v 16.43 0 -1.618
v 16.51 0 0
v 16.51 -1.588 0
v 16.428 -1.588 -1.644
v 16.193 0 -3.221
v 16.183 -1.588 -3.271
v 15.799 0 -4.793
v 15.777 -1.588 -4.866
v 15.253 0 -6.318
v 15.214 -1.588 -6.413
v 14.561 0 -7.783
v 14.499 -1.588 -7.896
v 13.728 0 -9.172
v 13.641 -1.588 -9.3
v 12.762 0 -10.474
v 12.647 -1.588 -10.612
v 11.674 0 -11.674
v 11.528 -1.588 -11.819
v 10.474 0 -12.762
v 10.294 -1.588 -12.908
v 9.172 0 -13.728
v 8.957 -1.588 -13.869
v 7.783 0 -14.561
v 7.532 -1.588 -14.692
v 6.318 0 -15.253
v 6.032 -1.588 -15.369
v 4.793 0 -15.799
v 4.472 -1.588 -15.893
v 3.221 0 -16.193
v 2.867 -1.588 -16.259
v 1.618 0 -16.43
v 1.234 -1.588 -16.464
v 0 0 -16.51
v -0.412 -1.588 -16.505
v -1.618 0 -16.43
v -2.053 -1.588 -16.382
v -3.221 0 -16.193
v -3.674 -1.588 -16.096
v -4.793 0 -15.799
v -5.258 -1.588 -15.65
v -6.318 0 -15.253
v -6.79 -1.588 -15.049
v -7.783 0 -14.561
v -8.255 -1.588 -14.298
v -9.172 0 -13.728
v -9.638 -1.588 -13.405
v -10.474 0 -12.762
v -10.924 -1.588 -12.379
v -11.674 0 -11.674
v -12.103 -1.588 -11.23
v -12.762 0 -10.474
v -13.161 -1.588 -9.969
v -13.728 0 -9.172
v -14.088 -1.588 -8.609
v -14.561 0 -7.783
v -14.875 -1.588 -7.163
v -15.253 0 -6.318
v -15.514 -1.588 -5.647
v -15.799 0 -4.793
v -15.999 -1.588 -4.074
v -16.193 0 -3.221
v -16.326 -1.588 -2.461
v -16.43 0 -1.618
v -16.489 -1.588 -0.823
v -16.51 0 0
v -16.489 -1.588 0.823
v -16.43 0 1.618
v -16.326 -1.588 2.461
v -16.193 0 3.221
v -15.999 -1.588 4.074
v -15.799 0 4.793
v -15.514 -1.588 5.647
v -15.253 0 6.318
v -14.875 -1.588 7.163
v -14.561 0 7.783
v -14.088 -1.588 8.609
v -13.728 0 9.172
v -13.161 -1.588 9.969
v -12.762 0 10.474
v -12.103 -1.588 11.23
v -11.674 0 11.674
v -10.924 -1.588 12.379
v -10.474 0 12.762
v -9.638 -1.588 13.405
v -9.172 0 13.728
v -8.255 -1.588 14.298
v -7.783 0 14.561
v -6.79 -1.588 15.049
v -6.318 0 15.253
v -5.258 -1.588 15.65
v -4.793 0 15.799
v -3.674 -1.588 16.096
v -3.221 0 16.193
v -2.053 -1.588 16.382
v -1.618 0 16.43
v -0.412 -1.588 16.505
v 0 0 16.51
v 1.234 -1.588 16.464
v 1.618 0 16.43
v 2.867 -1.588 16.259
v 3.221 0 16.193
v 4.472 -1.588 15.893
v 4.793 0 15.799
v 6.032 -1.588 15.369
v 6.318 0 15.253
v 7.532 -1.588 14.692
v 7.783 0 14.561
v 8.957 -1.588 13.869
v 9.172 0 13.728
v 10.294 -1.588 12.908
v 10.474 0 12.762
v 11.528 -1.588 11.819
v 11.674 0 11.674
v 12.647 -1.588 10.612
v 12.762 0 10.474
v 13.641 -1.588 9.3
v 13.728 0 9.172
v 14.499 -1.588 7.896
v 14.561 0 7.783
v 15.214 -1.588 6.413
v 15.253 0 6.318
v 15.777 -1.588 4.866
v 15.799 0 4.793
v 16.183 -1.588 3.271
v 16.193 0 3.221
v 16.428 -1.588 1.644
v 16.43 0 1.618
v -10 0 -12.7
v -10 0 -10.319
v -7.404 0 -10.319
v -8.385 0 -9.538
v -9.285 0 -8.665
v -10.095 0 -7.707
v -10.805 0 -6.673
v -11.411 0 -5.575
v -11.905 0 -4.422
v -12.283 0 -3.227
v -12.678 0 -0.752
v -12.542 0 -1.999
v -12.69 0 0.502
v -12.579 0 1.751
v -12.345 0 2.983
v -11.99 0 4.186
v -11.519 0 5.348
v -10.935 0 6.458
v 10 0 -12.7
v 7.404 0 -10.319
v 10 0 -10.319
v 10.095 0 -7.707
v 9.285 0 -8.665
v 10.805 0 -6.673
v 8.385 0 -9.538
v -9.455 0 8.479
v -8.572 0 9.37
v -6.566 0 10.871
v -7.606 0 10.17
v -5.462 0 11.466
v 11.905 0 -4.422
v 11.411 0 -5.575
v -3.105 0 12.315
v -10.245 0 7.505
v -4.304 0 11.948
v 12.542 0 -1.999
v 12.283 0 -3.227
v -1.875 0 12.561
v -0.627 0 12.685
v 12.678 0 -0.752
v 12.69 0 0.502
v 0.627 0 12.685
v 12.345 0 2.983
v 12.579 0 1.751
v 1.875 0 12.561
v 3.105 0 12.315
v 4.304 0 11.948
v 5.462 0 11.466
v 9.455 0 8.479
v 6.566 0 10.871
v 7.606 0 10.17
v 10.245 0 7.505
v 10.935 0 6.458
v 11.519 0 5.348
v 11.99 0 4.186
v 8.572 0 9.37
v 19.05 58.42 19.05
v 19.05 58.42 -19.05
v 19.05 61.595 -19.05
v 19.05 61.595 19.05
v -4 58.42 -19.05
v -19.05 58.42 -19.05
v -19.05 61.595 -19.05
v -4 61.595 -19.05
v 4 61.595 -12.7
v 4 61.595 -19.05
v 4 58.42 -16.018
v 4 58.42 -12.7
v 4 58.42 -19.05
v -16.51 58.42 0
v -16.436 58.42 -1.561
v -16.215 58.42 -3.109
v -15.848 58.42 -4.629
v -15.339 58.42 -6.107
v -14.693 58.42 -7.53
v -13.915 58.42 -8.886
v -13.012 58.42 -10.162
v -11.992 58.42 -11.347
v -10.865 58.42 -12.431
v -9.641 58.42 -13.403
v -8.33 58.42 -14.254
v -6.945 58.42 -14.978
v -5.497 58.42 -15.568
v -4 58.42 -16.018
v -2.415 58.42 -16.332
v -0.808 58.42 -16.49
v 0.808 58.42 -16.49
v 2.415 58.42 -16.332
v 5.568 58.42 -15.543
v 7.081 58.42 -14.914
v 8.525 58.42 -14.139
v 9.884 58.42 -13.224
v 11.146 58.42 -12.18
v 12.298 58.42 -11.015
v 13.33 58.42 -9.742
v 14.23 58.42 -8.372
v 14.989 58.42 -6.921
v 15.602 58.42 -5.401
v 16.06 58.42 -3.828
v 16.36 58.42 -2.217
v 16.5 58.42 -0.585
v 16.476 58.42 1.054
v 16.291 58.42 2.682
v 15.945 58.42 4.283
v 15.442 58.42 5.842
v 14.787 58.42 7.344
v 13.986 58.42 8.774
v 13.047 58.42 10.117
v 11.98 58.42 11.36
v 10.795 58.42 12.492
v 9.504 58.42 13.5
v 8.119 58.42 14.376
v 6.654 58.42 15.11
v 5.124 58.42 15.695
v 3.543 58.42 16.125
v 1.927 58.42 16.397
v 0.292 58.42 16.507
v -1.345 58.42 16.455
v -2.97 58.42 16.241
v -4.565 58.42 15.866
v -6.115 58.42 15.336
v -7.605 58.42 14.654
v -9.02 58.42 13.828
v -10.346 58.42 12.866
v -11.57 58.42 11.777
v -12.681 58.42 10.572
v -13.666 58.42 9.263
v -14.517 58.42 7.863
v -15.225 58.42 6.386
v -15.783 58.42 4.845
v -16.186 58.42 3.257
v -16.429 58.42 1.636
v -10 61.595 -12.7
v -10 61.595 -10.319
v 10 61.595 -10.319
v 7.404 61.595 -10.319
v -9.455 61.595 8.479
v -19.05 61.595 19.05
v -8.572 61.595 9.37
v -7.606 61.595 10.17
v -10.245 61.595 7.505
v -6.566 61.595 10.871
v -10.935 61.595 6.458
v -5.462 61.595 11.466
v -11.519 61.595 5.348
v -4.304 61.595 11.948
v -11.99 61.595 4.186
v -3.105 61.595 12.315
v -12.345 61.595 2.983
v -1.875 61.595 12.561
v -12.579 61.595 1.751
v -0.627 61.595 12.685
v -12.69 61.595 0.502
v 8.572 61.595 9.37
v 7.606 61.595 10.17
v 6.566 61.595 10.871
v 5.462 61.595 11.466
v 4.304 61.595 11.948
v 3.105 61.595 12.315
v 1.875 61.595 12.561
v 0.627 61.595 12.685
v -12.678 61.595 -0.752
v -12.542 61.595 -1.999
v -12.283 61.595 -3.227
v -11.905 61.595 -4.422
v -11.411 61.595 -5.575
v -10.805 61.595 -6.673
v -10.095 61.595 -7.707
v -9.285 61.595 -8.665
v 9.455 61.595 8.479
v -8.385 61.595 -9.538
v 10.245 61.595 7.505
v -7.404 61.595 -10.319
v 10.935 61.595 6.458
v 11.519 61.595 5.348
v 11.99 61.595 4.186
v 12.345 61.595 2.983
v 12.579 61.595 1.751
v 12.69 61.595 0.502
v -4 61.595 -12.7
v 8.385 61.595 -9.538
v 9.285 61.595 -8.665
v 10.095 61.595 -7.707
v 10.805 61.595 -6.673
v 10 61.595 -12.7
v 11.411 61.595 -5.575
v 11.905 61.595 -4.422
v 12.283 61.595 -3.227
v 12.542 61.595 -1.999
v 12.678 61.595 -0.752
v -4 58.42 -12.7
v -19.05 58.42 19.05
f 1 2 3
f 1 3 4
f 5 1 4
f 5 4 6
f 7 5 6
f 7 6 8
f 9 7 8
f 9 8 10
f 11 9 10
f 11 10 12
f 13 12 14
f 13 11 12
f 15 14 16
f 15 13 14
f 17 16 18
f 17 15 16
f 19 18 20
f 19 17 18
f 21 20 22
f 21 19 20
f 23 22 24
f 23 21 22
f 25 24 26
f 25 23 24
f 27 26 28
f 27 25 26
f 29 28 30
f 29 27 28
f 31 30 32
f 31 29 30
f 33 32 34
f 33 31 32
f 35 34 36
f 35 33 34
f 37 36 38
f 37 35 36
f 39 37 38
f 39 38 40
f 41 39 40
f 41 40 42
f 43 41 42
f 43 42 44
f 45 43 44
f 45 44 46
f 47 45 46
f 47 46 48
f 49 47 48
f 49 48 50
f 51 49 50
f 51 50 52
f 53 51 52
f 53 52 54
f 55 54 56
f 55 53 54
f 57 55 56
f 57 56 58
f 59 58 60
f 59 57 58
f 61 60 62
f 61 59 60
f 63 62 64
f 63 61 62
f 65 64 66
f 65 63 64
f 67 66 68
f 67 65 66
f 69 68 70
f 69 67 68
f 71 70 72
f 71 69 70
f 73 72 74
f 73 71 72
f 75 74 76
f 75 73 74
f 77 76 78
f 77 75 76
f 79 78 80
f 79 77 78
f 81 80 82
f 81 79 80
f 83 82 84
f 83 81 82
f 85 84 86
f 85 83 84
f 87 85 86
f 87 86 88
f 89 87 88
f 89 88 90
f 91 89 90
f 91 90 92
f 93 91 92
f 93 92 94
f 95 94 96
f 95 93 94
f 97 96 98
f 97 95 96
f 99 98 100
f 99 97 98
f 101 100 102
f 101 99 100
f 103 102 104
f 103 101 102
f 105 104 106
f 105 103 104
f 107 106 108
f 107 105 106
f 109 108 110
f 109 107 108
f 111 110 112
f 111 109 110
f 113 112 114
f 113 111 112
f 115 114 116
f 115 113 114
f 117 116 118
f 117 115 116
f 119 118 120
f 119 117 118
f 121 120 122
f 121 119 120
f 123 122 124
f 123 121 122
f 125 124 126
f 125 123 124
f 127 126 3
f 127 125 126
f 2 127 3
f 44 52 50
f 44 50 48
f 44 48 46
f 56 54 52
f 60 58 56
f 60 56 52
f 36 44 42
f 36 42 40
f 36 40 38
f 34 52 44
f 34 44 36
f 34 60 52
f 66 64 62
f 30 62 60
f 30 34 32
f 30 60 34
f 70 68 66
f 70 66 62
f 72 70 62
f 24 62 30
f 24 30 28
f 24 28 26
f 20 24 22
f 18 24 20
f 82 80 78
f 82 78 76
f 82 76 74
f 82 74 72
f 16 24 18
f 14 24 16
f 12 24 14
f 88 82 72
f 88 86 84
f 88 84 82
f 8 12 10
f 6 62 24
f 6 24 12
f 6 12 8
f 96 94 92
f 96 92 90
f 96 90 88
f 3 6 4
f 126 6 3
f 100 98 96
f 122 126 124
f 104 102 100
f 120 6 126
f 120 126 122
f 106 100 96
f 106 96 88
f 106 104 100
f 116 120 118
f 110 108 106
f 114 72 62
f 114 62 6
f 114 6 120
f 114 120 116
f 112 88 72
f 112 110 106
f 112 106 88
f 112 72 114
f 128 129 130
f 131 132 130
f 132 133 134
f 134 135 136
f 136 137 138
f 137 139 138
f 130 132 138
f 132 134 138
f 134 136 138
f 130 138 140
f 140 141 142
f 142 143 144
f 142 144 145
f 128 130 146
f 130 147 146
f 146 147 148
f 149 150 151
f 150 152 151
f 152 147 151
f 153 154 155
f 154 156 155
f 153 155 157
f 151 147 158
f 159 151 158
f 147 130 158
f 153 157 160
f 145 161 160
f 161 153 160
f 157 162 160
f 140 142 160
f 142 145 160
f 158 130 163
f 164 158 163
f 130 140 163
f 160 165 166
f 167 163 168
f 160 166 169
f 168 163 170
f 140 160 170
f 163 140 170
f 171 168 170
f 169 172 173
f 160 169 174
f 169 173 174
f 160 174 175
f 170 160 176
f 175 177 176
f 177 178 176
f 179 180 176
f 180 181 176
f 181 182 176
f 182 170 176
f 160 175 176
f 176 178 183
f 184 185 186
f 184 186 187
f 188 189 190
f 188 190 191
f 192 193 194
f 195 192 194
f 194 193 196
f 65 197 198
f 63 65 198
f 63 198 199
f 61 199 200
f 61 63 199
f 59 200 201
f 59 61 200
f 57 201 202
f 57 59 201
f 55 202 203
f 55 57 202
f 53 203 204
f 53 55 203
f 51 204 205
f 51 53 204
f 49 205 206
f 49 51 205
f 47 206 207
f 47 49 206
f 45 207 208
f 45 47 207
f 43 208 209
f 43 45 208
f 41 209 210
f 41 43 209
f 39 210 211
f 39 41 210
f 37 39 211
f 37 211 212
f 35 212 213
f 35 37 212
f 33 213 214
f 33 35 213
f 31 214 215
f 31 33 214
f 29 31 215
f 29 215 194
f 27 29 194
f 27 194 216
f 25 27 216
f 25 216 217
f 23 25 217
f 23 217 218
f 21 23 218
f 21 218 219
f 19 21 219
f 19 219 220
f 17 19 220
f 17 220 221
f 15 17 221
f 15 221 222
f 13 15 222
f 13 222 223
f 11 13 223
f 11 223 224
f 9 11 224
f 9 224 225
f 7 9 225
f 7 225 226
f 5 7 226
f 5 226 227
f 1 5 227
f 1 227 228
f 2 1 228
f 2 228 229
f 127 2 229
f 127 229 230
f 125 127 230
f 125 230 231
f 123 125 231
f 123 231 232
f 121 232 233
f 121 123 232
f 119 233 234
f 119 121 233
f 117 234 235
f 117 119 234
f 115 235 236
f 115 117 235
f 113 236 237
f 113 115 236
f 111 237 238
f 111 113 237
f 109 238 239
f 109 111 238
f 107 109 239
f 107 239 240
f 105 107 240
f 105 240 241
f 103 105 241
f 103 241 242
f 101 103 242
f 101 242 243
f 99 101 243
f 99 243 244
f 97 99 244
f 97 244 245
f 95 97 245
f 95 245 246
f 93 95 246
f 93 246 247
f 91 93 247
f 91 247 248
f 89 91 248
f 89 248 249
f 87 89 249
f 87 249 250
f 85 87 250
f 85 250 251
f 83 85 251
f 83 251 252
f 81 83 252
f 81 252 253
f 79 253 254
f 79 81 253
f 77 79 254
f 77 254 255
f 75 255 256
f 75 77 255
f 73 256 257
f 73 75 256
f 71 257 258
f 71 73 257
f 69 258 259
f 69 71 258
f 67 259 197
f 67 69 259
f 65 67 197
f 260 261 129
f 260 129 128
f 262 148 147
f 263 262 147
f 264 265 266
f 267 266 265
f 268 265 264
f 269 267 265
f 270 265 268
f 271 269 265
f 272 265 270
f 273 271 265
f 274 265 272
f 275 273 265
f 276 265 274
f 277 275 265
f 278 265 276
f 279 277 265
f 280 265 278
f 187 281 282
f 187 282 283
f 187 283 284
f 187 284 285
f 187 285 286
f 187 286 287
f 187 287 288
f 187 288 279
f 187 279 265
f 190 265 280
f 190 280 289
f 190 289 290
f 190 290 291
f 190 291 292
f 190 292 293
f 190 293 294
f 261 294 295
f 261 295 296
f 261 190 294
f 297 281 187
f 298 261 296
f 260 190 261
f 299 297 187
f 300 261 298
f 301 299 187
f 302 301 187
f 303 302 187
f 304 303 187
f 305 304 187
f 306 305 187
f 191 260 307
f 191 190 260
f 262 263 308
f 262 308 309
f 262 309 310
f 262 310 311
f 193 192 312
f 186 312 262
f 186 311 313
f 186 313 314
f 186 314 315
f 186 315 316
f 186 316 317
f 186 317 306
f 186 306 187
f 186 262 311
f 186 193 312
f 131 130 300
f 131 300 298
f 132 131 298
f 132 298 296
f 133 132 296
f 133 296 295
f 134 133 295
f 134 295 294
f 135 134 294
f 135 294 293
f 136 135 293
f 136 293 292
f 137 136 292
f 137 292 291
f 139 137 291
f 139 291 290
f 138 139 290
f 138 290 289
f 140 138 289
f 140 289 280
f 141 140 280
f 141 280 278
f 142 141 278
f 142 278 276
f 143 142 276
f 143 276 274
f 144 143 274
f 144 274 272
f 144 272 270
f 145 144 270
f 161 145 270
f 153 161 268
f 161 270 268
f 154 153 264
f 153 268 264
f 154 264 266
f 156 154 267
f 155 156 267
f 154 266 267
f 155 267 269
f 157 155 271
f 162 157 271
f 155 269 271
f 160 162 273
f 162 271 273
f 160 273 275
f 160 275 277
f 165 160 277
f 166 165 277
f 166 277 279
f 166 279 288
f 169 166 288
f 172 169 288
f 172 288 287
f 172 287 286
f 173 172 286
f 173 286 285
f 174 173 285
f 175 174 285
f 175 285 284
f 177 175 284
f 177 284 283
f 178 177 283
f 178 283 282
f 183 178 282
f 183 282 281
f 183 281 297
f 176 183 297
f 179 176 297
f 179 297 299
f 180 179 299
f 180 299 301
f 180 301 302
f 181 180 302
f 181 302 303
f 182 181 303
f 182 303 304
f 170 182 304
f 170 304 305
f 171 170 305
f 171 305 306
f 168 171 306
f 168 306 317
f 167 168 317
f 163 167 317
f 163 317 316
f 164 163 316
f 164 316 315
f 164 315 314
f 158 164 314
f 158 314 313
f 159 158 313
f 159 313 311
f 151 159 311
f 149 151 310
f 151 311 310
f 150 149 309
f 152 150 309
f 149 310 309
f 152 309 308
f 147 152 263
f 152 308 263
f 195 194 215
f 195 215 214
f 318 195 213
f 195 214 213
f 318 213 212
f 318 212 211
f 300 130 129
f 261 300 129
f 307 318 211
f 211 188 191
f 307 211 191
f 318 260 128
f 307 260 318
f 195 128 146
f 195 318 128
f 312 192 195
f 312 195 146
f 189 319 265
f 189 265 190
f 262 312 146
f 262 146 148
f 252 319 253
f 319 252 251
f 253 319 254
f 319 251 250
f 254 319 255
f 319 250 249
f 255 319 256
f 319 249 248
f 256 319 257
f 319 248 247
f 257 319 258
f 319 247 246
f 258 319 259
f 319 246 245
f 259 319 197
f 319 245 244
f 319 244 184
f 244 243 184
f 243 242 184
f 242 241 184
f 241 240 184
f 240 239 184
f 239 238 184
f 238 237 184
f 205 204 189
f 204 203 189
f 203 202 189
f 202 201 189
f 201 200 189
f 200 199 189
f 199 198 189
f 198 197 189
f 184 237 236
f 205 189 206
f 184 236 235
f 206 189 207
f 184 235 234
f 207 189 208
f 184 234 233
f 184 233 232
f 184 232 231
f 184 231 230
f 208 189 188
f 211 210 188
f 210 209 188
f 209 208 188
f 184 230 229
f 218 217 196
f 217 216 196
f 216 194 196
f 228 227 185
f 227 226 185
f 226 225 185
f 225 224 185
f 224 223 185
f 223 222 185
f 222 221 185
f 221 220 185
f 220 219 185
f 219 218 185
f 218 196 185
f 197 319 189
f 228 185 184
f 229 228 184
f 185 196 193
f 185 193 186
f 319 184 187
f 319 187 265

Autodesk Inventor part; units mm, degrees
ref_plane "YZ Plane" through (0, 0, 0) normal (1, 0, 0) x (0, 1, 0)
ref_plane "XZ Plane" through (0, 0, 0) normal (0, 1, 0) x (-1, 0, 0)
ref_plane "XY Plane" through (0, 0, 0) normal (0, 0, 1) x (1, 0, 0)
sketch "Sketch1" plane through (0, 0, 0) normal (0, 1, 0) x (-1, 0, 0)
  circle A0 centre (0, 0) radius 16.51
  dimension "d0" = 33.02
extrude "Extrusion1" add sketch "Sketch1" along normal blind 58.42
sketch "Sketch3" plane through (0, 58.42, 0) normal (0, 1, 0) x (1, 0, 0)
  line L0 (-19.05, 19.05) -> (19.05, 19.05)
  line L1 (19.05, 19.05) -> (19.05, -19.05)
  line L2 (19.05, -19.05) -> (-19.05, -19.05)
  line L3 (-19.05, -19.05) -> (-19.05, 19.05)
  point P0 (0, 0)
  point P1 (19.05, 0)
  point P2 (0, 19.05)
  dimension "d8" = 38.1
  dimension "d9" = 38.1
extrude "Extrusion3" add sketch "Sketch3" along normal blind 3.175
sketch "Sketch4" plane through (0, 61.595, 0) normal (0, 1, 0) x (1, 0, 0)
  circle A0 centre (0, 0) radius 12.7
  line L0 (-10, 12.7) -> (10, 12.7)
  line L1 (10, 12.7) -> (10, 10.3187)
  line L2 (10, 10.3187) -> (-10, 10.3187)
  line L3 (-10, 10.3187) -> (-10, 12.7)
  point P0 (-12.7, 0)
  point P1 (12.7, 0)
  point P2 (0, 12.7)
  point P3 (-7.4036, 10.3187)
  point P4 (7.4036, 10.3187)
  dimension "d12" = 25.4
  dimension "d13" = 20
  dimension "d14" = 2.3813
extrude "Extrusion4" cut sketch "Sketch4" against normal blind 61.9125
sketch "Sketch5" plane through (19.05, 58.42, -19.05) normal (0, 0, -1) x (-1, 0, 0)
  line L0 (15.05, 0) -> (23.05, 0)
  line L1 (23.05, 0) -> (23.05, 3.175)
  line L2 (23.05, 3.175) -> (15.05, 3.175)
  line L3 (15.05, 3.175) -> (15.05, 0)
  line L4 (0, 0) -> (0, 3.175) projected
  line L5 (0, 3.175) -> (38.1, 3.175) projected
  point P0 (19.05, -58.42)
  point P1 (19.05, 1.5875)
  point P2 (23.05, 1.5875)
  point P3 (19.05, 3.175)
  dimension "d17" = 8
  dimension "d18" = 3.175
  dimension "d20" = 19.05
  dimension "d21" = 0
extrude "Extrusion5" cut sketch "Sketch5" against normal blind 12.7
sketch "Sketch6" plane through (0, 0, 0) normal (0, -1, 0) x (1, 0, 0)
  arc A0 (7.4036, -10.3187) -> (-7.4036, -10.3187) centre (0, 0) ccw projected
  circle A1 centre (0, 0) radius 16.51
extrude "Extrusion6" add sketch "Sketch6" along normal blind 1.5875
properties part number "WaterBucket2"
